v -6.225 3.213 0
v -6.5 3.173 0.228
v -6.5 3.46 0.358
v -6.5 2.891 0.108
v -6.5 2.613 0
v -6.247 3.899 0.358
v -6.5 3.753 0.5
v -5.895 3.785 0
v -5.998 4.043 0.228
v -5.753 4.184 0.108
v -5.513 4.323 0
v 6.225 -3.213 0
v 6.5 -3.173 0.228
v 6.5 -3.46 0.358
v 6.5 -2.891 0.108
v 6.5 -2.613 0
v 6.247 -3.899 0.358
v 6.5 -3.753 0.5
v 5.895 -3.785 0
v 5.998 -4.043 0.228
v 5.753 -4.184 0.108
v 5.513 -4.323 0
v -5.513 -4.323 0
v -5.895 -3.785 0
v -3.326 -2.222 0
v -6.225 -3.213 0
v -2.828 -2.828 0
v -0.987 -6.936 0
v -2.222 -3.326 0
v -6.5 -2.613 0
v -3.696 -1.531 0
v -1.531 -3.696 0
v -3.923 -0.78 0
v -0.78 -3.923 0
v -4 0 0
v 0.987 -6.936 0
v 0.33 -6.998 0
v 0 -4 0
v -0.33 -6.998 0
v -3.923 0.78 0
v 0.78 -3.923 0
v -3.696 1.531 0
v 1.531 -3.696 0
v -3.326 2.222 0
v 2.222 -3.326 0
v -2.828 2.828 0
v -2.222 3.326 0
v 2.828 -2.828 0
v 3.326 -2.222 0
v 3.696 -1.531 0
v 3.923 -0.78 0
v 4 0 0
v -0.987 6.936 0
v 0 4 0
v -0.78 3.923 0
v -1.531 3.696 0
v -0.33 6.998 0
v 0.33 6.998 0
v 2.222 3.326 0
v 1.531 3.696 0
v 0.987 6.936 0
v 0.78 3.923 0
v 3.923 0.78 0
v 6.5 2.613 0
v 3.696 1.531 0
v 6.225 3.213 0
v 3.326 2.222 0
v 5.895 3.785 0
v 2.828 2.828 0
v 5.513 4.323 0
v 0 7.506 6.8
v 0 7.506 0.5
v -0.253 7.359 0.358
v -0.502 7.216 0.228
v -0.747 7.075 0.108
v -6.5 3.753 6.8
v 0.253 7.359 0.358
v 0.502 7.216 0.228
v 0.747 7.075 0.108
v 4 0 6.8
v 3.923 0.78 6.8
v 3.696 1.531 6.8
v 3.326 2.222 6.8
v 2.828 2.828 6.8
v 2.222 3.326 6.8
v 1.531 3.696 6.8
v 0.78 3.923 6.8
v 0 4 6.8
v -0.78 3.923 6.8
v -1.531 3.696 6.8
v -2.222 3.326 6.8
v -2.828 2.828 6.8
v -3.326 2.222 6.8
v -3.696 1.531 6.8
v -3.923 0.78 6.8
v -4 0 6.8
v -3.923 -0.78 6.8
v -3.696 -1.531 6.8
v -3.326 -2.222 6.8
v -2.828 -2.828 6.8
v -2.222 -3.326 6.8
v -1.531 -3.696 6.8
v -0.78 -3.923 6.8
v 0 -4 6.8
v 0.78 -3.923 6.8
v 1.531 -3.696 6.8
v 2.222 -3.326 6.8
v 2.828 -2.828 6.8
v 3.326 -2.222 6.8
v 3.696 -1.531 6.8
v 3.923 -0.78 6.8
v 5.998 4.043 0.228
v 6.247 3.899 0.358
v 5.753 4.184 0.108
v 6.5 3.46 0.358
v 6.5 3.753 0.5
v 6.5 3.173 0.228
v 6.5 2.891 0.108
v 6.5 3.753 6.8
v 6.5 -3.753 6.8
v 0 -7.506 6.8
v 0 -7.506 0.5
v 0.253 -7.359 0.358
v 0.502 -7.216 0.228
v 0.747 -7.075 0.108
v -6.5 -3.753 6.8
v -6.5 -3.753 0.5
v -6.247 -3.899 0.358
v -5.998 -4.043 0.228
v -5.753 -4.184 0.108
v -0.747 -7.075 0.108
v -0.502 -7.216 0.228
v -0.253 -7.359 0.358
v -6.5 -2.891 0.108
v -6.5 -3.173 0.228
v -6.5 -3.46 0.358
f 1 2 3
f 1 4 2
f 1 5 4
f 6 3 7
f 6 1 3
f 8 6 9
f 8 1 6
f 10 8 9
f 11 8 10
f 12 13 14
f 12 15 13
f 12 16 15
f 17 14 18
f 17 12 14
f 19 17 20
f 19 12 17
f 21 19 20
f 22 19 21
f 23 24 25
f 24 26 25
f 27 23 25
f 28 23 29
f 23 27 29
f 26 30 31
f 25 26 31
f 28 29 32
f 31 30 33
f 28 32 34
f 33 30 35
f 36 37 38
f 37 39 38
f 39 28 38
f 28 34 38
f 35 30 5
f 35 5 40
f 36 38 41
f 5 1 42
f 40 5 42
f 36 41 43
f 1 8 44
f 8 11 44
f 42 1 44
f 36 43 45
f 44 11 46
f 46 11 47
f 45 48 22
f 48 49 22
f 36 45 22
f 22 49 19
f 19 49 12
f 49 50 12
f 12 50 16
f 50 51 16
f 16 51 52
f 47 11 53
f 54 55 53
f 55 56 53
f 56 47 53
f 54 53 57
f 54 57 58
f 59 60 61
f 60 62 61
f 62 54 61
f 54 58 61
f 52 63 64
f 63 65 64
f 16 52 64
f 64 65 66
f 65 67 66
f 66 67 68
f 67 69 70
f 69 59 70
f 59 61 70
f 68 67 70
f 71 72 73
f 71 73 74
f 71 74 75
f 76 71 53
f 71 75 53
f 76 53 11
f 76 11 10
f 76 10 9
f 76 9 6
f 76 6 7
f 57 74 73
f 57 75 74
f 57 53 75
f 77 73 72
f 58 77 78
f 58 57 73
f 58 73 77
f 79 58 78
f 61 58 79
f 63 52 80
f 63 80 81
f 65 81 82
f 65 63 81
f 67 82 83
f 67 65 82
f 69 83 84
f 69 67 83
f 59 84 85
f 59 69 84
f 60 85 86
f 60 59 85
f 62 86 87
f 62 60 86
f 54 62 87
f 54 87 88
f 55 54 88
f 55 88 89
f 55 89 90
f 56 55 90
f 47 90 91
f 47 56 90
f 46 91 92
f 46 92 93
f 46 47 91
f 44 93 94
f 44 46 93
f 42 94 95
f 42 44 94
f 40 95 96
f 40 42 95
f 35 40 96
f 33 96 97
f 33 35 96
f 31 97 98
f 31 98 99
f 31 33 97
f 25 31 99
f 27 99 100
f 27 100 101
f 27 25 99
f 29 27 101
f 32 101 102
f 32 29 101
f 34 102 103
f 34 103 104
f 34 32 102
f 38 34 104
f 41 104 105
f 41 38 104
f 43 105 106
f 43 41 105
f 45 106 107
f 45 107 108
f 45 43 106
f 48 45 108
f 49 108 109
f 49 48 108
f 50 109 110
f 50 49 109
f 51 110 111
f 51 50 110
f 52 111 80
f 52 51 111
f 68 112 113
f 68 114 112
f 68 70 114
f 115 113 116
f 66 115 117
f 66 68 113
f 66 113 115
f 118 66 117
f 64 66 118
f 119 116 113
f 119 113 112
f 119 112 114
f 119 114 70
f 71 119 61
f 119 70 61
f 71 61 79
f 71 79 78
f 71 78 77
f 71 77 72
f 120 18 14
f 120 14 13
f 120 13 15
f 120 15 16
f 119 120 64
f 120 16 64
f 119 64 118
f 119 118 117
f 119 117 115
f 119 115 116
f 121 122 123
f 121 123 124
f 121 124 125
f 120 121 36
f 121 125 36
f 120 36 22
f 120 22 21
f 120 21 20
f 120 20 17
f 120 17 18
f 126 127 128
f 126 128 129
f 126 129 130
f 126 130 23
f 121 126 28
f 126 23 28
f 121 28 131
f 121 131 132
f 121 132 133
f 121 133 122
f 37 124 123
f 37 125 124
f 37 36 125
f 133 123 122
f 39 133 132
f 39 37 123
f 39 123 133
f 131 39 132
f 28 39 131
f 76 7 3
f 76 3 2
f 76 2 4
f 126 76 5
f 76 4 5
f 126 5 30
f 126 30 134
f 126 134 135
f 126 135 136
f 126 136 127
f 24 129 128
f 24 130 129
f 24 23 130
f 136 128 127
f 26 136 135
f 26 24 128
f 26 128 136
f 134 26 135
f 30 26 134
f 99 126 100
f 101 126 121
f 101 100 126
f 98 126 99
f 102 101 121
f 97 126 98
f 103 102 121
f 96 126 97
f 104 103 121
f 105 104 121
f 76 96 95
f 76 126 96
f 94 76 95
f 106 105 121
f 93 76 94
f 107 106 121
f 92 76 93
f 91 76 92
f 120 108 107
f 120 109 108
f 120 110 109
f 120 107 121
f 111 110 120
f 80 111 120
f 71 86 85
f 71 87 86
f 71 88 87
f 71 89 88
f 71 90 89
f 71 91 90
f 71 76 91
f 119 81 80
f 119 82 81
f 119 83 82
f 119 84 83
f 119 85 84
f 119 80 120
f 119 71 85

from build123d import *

# Parameters (mm, degrees)
F0_R     = 4
F1_DEPTH = 6.8


with BuildPart() as f1:
    # F0 (on Top) → F1 (new body)
    with BuildSketch(Plane.XY):
        Polygon((-6.5, 3.7527767497), (-6.5, -3.7527767497), (0, -7.5055534995), (6.5, -3.7527767497), (6.5, 3.7527767497), (0, 7.5055534995), align=None)
        Circle(F0_R, mode=Mode.SUBTRACT)
    extrude(amount=F1_DEPTH)

    # F2 (on Right) → F3 (revolve, cut)
    with BuildSketch(Plane.YZ):
        Polygon((7.0055534995, 0), (7.5055534995, 0), (7.5055534995, 0.5), align=None)
    revolve(axis=Axis((0, 0, 0), (0, 0, -1)), mode=Mode.SUBTRACT)


solid = f1.part
